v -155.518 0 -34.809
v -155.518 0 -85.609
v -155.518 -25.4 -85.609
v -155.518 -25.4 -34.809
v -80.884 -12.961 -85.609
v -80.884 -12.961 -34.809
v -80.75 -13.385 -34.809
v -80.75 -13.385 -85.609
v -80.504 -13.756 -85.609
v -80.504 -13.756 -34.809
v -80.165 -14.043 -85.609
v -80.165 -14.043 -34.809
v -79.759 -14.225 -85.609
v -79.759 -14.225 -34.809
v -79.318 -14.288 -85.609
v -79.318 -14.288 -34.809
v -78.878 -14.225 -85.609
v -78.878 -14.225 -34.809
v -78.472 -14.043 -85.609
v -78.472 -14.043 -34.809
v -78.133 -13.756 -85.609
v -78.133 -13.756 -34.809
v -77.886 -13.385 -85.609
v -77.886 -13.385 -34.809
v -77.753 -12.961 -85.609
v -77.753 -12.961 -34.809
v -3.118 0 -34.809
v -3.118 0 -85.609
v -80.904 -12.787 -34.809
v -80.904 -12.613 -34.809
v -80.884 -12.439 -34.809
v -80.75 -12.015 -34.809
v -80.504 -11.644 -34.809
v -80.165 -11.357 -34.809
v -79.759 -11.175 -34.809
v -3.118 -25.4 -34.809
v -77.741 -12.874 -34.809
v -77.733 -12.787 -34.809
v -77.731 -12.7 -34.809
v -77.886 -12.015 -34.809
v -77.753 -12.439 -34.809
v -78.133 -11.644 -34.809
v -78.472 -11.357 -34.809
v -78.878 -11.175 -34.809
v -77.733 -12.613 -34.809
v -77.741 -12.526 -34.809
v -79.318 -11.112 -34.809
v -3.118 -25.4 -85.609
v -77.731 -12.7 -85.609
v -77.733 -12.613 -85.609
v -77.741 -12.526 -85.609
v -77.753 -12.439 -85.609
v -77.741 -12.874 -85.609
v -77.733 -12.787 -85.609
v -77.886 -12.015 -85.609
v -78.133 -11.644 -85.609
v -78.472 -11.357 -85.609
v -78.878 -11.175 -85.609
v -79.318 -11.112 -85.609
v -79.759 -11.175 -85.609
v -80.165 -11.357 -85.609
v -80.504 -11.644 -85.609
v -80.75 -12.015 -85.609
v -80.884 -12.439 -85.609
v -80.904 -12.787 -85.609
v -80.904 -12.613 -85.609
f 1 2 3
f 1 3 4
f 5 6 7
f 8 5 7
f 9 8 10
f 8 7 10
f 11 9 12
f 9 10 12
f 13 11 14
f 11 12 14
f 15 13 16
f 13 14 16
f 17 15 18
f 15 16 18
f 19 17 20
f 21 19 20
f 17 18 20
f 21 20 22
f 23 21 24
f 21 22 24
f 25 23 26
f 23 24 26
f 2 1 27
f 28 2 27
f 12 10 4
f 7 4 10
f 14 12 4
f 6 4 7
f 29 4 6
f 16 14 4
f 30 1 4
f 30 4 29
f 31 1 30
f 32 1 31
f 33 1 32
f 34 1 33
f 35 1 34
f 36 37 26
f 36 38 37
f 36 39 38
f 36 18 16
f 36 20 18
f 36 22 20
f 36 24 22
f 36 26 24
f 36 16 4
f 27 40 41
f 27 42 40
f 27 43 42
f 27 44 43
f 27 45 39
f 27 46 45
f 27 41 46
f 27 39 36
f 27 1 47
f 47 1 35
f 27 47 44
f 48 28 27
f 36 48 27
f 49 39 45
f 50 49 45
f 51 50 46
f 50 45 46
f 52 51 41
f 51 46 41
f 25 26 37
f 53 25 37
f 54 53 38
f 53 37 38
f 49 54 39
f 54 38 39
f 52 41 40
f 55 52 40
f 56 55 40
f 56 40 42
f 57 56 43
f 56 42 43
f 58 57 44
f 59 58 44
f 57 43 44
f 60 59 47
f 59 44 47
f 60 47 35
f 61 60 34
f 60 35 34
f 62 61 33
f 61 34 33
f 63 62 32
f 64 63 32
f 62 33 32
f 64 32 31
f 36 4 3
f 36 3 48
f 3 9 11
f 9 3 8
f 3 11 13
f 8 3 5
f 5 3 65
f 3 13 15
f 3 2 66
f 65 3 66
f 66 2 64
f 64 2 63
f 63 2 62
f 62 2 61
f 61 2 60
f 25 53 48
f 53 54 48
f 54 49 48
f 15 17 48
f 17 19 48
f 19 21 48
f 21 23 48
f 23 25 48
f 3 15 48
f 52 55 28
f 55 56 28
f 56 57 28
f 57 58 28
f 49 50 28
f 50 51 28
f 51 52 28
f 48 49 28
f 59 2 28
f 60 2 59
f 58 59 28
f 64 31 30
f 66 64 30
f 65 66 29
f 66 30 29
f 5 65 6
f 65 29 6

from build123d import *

# Parameters (mm, degrees)
F0_W     = 152.4
F0_H     = 50.8
F1_DEPTH = 25.4
F3_DEPTH = 50.8


with BuildPart() as f1:
    # F0 (on Front) → F1 (new body)
    with BuildSketch(Plane.XZ):
        with Locations((-79.3184274912, -60.2086835265)):
            Rectangle(F0_W, F0_H)
    extrude(amount=F1_DEPTH)

    # F2 (on face) → F3 (cut)
    with BuildSketch(Plane.XY.offset(-34.8086835265)):
        with BuildLine():
            Line((-77.7525271371, -12.4390166077), (-79.3184274912, -12.7))
            Line((-79.3184274912, -12.7), (-77.7525271371, -12.9609833923))
            ThreePointArc((-77.7525271371, -12.9609833923), (-77.736336618, -12.8309378438), (-77.7309274912, -12.7))
            ThreePointArc((-77.7309274912, -12.7), (-77.736336618, -12.5690621562), (-77.7525271371, -12.4390166077))
        make_face()
        with BuildLine():
            ThreePointArc((-77.7525271371, -12.4390166077), (-79.3184274912, -11.1125), (-80.8843278453, -12.4390166077))
            Line((-80.8843278453, -12.4390166077), (-79.3184274912, -12.7))
            Line((-79.3184274912, -12.7), (-77.7525271371, -12.4390166077))
        make_face()
        with BuildLine():
            Line((-79.3184274912, -12.7), (-80.8843278453, -12.4390166077))
            ThreePointArc((-80.8843278453, -12.4390166077), (-80.9059274912, -12.7), (-80.8843278453, -12.9609833923))
            Line((-80.8843278453, -12.9609833923), (-79.3184274912, -12.7))
        make_face()
        with BuildLine():
            Line((-77.7525271371, -12.9609833923), (-79.3184274912, -12.7))
            Line((-79.3184274912, -12.7), (-80.8843278453, -12.9609833923))
            ThreePointArc((-80.8843278453, -12.9609833923), (-79.3184274912, -14.2875), (-77.7525271371, -12.9609833923))
        make_face()
    extrude(amount=-F3_DEPTH, mode=Mode.SUBTRACT)


solid = f1.part
